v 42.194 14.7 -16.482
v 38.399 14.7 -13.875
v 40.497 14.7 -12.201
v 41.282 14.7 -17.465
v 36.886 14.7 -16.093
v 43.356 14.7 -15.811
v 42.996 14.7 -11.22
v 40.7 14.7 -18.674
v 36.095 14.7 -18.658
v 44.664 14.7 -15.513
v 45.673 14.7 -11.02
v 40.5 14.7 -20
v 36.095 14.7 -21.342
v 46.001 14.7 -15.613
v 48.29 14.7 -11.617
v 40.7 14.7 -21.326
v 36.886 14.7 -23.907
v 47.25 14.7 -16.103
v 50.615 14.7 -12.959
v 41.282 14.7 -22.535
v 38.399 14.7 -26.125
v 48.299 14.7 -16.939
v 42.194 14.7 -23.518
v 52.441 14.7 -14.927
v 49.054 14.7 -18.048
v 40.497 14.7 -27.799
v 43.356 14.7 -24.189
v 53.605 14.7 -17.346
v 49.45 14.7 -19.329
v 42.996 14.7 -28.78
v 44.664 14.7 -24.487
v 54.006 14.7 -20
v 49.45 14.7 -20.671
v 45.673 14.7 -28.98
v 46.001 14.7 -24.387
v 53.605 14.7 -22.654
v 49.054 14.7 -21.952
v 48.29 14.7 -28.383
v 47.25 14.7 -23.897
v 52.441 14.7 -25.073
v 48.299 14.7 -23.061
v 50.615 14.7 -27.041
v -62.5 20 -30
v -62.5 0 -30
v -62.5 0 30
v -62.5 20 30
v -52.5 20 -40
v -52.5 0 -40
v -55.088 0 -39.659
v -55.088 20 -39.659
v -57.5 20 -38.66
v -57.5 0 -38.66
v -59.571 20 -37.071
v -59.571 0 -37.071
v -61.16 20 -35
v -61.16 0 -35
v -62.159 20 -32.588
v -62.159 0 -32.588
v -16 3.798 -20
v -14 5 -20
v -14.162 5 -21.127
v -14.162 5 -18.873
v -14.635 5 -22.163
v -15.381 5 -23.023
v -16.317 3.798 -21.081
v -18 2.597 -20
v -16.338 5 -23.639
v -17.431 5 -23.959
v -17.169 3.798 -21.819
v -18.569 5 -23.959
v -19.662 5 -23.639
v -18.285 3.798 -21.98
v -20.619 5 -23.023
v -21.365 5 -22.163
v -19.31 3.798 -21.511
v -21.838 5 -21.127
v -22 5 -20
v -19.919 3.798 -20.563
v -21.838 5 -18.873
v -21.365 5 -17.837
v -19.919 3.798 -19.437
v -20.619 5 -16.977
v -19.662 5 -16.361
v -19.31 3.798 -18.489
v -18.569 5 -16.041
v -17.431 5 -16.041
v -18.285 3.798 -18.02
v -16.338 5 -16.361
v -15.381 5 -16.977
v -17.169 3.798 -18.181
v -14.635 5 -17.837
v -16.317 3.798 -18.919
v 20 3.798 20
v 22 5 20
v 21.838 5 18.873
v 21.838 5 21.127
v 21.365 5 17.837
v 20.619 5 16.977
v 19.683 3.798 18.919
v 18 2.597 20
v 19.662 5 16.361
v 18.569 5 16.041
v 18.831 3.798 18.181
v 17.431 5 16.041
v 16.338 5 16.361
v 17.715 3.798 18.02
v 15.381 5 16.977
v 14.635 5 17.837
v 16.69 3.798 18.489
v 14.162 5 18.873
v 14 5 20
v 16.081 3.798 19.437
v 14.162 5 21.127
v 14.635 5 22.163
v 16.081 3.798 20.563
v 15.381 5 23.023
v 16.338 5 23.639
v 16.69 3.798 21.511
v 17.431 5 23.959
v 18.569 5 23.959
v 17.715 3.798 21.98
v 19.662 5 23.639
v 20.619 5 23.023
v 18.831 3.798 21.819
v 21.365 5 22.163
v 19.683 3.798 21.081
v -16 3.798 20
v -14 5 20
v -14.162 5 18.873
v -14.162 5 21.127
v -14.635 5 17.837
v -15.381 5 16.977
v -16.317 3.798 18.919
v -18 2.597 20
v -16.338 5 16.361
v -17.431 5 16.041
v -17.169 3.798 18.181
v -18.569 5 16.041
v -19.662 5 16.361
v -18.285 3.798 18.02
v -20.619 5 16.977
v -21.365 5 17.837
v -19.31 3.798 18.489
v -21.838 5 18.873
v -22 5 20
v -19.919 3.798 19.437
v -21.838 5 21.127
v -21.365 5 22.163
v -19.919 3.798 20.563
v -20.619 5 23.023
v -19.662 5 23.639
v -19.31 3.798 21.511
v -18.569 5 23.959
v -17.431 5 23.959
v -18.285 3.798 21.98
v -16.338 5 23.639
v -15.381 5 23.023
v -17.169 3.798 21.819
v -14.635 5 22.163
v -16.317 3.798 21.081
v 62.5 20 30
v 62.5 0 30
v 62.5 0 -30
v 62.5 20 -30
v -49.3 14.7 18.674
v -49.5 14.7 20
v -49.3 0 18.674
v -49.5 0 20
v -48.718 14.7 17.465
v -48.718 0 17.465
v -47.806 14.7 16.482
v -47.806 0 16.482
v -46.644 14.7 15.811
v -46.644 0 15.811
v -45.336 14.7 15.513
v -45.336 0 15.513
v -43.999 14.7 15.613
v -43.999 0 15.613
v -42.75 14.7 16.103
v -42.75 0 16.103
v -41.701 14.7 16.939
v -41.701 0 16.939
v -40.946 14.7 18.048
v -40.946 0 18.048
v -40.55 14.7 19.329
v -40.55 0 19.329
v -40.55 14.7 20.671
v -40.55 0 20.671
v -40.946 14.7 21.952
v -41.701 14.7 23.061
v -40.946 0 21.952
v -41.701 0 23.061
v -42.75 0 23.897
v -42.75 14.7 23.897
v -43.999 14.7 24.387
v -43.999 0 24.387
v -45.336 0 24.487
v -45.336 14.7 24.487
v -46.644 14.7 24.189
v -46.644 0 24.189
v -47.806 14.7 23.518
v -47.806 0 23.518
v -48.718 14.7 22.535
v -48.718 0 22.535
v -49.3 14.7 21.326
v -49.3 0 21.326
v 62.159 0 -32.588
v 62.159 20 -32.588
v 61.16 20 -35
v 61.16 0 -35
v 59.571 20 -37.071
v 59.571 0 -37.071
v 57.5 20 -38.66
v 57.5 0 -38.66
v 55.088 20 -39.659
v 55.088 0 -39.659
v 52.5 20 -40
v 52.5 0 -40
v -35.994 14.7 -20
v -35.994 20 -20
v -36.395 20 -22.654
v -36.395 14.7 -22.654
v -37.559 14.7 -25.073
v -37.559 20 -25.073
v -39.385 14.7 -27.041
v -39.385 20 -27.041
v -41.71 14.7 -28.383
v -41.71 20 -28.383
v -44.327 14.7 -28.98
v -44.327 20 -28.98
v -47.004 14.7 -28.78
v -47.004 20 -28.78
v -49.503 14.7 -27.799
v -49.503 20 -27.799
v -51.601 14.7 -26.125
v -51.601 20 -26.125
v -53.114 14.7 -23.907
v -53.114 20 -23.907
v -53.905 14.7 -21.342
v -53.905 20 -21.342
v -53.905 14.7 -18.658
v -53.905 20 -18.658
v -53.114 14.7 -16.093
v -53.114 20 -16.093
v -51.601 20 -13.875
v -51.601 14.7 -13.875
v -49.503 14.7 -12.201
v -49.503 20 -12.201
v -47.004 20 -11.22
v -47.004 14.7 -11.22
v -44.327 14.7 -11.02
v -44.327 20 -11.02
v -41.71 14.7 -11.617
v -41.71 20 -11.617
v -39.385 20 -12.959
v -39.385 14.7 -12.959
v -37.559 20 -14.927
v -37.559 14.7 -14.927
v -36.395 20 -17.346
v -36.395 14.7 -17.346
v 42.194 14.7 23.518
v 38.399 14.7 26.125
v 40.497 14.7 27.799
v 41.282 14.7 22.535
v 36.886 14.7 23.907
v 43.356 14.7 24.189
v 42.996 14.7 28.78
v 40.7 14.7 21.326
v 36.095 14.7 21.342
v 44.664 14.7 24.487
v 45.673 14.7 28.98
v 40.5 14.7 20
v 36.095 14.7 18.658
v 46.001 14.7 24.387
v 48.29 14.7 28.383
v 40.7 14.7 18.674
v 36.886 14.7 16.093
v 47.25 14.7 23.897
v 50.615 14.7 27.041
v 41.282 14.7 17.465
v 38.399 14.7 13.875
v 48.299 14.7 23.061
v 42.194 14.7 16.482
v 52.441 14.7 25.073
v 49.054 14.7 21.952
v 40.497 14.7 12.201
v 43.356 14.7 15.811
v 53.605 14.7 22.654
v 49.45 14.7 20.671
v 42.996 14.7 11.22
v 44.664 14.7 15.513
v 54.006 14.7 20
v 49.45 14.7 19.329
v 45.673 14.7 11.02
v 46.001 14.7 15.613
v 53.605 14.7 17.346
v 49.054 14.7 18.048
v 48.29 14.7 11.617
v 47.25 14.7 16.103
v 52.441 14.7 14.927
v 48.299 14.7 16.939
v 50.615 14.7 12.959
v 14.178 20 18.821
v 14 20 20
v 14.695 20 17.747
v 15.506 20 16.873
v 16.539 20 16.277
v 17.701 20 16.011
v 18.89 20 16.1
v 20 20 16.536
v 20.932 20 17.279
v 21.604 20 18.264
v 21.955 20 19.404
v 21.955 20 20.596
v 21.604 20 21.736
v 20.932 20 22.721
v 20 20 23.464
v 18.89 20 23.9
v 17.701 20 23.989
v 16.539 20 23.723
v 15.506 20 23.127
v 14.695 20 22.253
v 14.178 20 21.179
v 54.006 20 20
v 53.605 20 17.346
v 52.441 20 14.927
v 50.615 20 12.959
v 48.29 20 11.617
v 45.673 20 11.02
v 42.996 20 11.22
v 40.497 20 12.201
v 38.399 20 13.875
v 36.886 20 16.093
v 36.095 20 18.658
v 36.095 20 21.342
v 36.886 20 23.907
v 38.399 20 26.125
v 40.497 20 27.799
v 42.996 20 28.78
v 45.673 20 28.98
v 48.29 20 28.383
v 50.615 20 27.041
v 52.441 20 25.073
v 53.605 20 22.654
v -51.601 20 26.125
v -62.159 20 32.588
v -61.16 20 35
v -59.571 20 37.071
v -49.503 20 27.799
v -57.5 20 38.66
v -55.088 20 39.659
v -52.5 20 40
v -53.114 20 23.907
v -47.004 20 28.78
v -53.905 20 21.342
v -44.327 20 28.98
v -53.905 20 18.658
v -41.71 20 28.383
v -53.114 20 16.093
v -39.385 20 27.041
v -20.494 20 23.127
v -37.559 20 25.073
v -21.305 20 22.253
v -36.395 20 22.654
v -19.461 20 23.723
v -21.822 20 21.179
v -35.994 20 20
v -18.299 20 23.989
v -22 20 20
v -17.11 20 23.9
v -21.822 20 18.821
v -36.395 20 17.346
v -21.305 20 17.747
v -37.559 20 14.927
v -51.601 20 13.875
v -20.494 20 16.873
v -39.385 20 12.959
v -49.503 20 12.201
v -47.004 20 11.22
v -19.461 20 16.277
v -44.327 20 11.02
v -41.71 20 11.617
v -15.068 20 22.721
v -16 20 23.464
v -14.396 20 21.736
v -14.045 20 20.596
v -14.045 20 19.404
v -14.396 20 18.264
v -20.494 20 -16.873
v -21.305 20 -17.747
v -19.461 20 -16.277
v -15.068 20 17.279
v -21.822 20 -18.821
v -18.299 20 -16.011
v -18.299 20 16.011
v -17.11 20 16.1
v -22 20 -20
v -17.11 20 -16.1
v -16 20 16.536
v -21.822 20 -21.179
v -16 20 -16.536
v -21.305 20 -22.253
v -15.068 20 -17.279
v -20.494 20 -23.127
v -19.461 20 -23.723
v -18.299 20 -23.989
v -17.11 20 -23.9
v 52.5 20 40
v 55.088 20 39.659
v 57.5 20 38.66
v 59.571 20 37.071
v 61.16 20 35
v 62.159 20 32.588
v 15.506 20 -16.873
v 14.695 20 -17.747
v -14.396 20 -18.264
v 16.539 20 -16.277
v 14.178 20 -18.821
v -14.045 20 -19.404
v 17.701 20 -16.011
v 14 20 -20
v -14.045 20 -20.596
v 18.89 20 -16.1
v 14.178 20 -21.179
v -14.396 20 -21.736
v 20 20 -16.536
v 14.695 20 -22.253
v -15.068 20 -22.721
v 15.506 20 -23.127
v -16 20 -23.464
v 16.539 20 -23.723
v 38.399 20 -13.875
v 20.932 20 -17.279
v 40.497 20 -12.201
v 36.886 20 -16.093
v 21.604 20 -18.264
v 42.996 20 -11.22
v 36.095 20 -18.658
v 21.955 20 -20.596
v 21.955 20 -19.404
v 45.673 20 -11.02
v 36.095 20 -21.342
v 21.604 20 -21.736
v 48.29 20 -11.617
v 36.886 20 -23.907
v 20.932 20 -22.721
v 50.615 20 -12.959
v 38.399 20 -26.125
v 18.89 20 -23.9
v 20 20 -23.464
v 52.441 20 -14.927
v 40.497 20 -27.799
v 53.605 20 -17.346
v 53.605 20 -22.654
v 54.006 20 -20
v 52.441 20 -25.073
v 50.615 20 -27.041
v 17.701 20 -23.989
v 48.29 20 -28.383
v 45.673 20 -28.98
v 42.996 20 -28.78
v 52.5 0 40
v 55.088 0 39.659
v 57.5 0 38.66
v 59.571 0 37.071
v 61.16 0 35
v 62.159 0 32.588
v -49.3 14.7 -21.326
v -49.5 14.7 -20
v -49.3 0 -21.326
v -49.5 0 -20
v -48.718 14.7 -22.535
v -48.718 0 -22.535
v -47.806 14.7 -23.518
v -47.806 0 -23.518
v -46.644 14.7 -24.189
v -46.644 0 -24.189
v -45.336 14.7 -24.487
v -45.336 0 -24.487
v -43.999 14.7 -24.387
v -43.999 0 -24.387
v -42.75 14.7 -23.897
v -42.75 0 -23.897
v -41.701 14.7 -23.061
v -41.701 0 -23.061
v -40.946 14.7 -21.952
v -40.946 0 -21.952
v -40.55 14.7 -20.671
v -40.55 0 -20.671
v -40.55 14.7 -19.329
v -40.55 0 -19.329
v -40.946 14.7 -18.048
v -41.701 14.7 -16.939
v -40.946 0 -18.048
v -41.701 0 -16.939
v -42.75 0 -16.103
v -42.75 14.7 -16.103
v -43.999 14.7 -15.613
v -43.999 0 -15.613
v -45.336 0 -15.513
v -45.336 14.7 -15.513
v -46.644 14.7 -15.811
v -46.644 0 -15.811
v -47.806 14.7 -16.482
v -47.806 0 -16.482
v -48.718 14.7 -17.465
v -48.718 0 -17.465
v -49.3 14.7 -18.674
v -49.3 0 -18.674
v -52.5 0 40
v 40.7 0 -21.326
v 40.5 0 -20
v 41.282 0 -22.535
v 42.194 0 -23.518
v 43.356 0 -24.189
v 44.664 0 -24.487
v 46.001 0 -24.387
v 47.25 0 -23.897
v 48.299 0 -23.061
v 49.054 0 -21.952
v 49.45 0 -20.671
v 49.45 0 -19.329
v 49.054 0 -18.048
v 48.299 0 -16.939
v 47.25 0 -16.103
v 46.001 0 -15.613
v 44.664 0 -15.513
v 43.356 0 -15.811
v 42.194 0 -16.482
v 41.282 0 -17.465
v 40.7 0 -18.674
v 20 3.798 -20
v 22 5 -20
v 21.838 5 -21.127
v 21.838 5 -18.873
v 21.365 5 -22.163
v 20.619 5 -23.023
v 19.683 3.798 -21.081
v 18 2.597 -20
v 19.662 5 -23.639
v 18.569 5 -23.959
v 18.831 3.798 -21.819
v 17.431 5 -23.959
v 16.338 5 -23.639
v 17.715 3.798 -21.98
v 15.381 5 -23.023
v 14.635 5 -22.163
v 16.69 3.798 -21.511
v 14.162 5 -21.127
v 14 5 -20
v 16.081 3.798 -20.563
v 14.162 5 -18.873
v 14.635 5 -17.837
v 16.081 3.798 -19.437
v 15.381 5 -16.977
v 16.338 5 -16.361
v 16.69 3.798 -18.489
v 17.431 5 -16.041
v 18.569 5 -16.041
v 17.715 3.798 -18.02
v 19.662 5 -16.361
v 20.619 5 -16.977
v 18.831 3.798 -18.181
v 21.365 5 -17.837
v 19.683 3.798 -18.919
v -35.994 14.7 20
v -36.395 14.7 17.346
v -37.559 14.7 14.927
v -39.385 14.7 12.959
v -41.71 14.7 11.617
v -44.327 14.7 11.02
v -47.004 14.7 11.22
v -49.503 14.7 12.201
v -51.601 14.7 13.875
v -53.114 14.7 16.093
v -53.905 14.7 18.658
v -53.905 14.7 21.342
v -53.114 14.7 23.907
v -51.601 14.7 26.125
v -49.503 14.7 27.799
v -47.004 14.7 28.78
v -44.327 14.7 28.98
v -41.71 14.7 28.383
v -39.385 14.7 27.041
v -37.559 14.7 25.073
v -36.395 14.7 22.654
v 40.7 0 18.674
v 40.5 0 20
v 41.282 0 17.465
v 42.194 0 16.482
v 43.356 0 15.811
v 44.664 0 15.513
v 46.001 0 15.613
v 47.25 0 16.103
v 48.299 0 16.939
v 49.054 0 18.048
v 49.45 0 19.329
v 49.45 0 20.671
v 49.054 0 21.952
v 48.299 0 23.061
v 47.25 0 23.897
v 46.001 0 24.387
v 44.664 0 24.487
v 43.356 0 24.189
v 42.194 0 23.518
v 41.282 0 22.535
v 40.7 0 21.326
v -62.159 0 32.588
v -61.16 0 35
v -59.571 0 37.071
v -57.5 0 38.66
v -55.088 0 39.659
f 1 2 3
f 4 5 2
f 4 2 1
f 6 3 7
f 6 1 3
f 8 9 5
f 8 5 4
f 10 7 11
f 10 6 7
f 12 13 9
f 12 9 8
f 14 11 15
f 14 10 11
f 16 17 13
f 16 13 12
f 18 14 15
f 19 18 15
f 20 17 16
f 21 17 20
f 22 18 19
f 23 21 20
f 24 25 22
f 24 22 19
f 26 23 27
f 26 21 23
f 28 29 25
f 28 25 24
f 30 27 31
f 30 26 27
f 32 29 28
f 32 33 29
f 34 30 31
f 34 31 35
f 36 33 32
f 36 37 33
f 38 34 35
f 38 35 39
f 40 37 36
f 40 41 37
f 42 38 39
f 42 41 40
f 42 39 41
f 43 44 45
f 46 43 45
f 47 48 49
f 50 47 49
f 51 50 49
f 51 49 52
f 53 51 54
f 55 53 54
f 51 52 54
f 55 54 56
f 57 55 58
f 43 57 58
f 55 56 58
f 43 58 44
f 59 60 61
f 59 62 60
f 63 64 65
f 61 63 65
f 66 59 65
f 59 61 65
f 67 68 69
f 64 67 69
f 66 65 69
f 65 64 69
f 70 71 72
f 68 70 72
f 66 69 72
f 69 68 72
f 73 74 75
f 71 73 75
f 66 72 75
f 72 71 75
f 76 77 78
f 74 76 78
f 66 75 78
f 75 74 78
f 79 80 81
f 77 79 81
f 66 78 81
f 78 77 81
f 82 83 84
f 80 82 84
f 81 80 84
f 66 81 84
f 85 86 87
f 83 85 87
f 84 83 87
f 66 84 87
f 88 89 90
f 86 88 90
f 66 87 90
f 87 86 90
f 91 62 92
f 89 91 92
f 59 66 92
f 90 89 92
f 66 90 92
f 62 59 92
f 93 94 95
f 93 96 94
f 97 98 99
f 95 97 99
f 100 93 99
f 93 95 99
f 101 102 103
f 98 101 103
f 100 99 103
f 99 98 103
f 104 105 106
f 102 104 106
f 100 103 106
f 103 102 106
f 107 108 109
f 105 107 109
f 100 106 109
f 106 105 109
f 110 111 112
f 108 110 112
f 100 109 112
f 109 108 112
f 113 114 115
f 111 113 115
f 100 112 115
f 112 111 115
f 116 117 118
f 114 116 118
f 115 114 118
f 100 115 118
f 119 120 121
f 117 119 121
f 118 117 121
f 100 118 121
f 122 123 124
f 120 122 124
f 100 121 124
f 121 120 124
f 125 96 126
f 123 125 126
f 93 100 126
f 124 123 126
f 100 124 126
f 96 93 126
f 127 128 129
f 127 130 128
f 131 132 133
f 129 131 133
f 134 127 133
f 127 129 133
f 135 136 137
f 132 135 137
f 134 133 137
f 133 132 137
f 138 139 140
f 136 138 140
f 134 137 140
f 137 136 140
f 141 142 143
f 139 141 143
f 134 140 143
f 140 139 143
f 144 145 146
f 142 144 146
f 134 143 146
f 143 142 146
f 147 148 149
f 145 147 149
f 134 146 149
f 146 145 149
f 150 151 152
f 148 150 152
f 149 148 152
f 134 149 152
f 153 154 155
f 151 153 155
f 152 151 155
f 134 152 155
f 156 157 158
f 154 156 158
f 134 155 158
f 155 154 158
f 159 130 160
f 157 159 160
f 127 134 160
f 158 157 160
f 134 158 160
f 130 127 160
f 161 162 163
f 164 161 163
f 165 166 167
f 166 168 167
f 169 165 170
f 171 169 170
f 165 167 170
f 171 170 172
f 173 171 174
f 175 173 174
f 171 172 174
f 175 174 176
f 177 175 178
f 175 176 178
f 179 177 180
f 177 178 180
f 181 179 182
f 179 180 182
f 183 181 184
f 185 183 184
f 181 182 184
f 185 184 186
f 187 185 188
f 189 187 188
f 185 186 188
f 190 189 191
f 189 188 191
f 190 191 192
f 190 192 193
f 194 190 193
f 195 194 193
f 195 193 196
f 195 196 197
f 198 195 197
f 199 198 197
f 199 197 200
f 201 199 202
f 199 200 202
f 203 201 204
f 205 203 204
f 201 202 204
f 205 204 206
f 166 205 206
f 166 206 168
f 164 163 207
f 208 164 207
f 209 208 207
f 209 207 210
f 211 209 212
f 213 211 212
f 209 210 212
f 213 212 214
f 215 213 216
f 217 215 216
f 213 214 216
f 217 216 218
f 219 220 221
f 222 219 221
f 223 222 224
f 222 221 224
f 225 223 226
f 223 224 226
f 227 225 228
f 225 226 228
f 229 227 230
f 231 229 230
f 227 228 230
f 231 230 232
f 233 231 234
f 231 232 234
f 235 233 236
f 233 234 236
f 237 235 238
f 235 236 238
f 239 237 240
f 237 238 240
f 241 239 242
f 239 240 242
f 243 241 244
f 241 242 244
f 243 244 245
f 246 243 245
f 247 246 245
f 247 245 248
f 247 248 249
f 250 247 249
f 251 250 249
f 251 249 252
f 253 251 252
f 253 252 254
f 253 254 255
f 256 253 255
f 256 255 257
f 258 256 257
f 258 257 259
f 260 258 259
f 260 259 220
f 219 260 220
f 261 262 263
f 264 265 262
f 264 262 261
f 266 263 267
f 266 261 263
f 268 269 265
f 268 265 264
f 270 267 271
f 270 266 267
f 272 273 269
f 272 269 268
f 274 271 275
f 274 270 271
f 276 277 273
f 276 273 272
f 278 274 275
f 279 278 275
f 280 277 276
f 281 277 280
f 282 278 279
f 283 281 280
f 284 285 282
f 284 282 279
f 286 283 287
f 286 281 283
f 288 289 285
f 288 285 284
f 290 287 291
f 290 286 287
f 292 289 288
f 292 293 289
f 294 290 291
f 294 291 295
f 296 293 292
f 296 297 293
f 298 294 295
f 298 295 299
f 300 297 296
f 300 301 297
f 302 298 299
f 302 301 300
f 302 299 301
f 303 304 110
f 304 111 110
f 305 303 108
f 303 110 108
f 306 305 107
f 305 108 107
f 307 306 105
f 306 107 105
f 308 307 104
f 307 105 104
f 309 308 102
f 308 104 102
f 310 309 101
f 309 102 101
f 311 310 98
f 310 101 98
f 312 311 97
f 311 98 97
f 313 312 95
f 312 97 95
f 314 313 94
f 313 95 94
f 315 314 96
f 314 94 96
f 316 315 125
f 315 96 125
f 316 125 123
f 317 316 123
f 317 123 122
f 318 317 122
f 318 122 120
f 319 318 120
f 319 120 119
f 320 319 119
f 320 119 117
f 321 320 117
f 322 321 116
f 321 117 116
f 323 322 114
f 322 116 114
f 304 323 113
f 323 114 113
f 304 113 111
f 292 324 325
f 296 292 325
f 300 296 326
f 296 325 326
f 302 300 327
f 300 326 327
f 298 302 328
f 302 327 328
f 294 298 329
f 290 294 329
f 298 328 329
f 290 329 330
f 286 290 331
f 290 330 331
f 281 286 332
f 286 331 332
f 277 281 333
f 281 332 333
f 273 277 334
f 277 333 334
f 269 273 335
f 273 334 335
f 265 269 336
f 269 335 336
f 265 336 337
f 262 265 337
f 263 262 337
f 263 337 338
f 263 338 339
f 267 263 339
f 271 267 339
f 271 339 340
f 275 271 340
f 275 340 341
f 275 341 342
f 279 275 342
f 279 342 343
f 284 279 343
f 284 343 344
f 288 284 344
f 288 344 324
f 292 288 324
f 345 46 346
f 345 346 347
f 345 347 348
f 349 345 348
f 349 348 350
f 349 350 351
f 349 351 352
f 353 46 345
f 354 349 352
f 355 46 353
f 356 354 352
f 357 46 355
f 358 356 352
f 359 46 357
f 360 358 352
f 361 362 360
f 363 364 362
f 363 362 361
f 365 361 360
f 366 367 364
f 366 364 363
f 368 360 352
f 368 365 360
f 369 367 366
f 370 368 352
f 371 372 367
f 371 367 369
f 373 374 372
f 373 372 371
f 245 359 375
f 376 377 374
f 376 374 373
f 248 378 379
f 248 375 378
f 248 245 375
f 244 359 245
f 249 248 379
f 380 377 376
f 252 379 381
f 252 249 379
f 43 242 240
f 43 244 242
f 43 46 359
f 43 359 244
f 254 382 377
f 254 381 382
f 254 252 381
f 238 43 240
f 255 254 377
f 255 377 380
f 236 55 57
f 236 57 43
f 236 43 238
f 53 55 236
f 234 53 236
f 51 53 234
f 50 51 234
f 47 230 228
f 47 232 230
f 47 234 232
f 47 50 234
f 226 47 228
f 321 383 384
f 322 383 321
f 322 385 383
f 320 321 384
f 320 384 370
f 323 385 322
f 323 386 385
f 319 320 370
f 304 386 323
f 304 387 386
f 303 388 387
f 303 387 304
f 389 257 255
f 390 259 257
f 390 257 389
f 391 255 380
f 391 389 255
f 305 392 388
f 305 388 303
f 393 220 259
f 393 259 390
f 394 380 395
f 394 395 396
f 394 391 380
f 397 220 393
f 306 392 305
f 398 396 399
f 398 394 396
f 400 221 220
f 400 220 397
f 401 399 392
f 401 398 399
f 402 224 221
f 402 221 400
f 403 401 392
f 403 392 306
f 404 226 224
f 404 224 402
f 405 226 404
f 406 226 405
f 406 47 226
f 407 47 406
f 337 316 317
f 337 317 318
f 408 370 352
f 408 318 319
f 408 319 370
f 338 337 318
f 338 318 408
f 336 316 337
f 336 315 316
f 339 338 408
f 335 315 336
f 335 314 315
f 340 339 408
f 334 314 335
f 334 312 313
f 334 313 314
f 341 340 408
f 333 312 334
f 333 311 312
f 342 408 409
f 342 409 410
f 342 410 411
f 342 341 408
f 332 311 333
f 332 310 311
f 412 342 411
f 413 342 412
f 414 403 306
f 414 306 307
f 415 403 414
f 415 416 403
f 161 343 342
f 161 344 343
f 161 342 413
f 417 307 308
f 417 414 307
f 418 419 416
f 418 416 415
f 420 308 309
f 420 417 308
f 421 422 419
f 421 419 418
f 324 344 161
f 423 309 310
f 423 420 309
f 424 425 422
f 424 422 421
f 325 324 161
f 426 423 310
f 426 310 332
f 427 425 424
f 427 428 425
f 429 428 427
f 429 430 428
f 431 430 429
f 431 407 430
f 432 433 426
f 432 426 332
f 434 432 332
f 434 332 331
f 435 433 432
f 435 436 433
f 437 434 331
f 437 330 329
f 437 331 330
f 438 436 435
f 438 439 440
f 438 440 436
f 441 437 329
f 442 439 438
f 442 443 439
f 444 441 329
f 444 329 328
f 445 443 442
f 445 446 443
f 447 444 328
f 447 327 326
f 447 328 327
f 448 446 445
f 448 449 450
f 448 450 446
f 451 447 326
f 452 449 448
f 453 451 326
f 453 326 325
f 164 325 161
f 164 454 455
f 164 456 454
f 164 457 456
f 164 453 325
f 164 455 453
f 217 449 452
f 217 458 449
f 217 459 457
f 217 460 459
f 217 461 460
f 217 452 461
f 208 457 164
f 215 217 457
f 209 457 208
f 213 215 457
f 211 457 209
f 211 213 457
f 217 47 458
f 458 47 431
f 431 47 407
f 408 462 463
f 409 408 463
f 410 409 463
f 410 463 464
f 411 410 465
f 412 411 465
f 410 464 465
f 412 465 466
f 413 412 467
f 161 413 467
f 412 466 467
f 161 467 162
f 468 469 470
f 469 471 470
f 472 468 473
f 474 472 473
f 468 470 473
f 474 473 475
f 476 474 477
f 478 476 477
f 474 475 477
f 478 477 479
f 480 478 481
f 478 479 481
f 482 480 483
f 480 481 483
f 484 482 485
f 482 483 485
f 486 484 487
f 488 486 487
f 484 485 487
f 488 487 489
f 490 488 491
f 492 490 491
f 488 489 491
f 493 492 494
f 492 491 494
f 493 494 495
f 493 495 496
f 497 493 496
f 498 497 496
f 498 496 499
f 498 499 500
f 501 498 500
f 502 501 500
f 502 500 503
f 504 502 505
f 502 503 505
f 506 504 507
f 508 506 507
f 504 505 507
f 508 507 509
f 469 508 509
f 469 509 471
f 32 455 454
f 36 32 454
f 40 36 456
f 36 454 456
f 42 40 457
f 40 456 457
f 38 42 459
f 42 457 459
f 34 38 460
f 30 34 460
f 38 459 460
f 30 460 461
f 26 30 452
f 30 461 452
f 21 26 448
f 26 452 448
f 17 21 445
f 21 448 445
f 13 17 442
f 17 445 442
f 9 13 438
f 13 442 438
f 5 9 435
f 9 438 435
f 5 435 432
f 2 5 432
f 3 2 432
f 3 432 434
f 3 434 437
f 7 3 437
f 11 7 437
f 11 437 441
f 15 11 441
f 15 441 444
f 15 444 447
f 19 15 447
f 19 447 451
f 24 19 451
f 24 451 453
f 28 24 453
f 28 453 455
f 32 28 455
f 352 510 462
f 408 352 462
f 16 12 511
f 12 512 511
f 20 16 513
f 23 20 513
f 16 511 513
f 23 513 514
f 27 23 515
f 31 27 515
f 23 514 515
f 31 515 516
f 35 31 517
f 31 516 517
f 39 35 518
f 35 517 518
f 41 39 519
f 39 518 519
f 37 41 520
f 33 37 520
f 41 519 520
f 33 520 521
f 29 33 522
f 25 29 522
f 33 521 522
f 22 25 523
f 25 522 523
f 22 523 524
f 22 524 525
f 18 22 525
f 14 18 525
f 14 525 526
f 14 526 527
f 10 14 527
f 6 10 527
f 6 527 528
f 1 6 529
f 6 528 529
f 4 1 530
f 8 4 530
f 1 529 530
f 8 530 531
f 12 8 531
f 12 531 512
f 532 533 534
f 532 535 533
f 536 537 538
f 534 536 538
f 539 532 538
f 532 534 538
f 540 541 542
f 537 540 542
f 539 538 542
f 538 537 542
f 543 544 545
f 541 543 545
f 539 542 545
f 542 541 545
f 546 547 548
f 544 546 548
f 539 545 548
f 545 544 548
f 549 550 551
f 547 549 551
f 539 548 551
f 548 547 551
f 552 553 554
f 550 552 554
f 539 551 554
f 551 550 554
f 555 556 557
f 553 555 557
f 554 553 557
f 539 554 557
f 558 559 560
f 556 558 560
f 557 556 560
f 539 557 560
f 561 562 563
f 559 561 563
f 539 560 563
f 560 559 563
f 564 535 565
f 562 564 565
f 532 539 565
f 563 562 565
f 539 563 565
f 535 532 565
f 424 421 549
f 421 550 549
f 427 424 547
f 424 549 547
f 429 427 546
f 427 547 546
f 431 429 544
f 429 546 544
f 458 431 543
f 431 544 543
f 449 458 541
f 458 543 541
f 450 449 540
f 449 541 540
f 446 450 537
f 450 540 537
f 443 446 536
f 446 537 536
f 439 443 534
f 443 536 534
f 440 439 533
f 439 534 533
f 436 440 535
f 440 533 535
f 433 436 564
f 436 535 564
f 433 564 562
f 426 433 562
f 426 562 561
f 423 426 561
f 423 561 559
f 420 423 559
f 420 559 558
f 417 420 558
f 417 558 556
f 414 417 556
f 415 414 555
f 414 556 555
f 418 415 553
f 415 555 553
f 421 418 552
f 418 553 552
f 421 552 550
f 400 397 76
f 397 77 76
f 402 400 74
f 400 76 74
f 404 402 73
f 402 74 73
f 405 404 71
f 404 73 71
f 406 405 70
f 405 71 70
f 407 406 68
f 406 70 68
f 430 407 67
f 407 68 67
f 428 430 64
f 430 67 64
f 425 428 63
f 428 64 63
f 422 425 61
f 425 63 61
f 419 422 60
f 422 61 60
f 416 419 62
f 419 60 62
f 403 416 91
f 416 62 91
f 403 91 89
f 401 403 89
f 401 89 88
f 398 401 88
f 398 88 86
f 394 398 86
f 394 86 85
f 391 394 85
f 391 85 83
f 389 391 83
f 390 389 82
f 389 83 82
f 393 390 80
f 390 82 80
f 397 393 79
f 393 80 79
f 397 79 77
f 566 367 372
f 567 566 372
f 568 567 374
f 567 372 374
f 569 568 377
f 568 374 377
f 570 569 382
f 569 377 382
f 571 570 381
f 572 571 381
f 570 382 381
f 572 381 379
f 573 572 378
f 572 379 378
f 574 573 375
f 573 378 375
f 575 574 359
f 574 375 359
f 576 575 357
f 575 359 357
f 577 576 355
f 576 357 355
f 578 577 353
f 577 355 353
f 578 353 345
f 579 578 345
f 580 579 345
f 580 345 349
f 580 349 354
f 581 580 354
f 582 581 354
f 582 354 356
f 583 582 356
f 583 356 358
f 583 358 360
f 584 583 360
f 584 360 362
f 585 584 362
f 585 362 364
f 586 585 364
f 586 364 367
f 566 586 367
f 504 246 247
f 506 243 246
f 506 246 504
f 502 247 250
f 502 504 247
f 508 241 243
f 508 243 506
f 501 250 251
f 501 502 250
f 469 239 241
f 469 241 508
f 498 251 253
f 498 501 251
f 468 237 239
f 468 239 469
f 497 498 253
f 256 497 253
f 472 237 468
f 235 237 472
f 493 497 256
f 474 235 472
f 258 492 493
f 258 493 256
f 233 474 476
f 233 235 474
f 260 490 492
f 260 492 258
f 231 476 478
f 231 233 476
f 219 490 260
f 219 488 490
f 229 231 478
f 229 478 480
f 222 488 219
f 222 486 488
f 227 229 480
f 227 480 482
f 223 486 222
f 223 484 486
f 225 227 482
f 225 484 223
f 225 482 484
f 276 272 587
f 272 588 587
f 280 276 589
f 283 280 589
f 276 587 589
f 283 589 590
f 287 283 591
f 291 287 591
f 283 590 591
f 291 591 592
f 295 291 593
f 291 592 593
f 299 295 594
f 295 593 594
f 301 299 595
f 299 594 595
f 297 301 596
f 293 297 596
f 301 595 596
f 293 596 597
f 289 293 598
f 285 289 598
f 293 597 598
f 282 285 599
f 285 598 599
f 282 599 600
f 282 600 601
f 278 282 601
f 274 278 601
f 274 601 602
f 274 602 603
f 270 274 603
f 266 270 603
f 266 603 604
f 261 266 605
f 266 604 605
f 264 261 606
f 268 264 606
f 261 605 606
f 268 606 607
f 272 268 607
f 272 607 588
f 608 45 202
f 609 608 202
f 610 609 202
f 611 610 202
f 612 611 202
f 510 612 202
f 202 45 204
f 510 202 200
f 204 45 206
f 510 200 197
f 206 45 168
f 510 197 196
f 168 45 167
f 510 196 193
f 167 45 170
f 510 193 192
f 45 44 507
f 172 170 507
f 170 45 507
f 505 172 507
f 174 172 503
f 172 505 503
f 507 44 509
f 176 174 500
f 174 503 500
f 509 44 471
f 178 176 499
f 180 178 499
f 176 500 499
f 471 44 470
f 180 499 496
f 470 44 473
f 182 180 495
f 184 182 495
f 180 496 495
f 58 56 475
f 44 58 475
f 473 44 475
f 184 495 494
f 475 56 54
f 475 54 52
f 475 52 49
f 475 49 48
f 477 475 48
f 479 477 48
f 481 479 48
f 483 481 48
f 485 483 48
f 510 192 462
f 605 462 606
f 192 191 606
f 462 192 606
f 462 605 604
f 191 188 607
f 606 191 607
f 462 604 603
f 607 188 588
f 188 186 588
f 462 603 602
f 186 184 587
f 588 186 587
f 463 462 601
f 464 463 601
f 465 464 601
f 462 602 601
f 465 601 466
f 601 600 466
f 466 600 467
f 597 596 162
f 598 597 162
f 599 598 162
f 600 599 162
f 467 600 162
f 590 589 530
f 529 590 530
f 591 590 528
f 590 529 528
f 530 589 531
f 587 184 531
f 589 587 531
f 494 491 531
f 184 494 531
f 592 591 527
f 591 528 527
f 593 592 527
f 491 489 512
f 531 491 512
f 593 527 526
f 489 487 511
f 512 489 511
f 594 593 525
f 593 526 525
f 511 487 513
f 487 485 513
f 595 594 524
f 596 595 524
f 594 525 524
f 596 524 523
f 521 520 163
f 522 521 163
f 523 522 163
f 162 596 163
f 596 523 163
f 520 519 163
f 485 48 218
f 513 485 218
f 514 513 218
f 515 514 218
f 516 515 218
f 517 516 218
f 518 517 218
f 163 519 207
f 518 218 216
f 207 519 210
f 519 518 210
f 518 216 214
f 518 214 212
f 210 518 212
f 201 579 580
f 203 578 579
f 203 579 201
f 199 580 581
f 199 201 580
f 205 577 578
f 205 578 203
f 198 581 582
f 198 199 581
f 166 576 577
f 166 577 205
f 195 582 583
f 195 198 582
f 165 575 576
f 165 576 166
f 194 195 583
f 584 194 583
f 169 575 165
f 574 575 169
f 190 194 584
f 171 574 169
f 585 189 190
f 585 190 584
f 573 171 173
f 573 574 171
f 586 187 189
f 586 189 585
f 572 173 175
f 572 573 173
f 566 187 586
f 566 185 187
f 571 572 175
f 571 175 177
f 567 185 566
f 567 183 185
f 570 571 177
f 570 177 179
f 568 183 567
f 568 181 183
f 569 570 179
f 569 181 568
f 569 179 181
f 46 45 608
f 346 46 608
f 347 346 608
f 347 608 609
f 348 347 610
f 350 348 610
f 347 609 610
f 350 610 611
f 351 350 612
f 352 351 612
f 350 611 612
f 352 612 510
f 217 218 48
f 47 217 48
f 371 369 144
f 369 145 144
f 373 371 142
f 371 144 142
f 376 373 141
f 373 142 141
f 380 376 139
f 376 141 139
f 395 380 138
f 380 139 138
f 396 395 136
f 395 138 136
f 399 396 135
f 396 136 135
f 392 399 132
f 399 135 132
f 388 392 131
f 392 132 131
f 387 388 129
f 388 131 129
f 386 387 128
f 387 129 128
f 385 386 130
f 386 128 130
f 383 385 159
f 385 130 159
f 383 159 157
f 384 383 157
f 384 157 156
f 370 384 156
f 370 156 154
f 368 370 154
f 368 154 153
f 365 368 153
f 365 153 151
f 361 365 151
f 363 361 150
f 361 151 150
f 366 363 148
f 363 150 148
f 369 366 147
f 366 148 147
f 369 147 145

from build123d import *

# Parameters (mm, degrees)
DODANIE_WYCI_GNI_CIE1_DEPTH                       = 20
OTWORY_USTALAJ_CE_8_0MM1_D                        = 8
OTWORY_USTALAJ_CE_8_0MM1_DEPTH                    = 15
OTWORY_USTALAJ_CE_8_0MM1_TIP                      = 2.403442476
POG_BIENIE_WALCOWE_POD_M8_RUB_Z_BEM_S_D           = 9
POG_BIENIE_WALCOWE_POD_M8_RUB_Z_BEM_S_CBORE_D     = 18.011
POG_BIENIE_WALCOWE_POD_M8_RUB_Z_BEM_S_CBORE_DEPTH = 5.3


with BuildPart() as part:
    # Szkic1 → Dodanie-wyciągnięcie1 (new body)
    with BuildSketch(Plane(origin=(0, 0, 0), x_dir=(1, 0, 0), z_dir=(0, 1, 0))):
        with BuildLine():
            Line((-52.5, -40), (52.5, -40))
            ThreePointArc((52.5, -40), (59.571067812, -37.071067812), (62.5, -30))
            Line((62.5, -30), (62.5, 30))
            ThreePointArc((62.5, 30), (59.571067812, 37.071067812), (52.5, 40))
            Line((52.5, 40), (-52.5, 40))
            ThreePointArc((-52.5, 40), (-59.571067812, 37.071067812), (-62.5, 30))
            Line((-62.5, 30), (-62.5, -30))
            ThreePointArc((-62.5, -30), (-59.571067812, -37.071067812), (-52.5, -40))
        make_face()
    extrude(amount=DODANIE_WYCI_GNI_CIE1_DEPTH)

    # Otwory ustalające Ø8.0mm1
    with Locations(Plane(origin=(0, 20, 0), x_dir=(1, 0, 0), z_dir=(0, 1, 0))):
        with Locations((-18, -20), (18, -20), (18, 20), (-18, 20)):
            Hole(OTWORY_USTALAJ_CE_8_0MM1_D / 2, depth=OTWORY_USTALAJ_CE_8_0MM1_DEPTH)
            with Locations((0, 0, -(OTWORY_USTALAJ_CE_8_0MM1_DEPTH + OTWORY_USTALAJ_CE_8_0MM1_TIP / 2))):  # 118° drill point
                Cone(0, OTWORY_USTALAJ_CE_8_0MM1_D / 2, OTWORY_USTALAJ_CE_8_0MM1_TIP, mode=Mode.SUBTRACT)

    # Pogłębienie walcowe pod M8 śrubę z łbem szeciokątnym1 (through all)
    with Locations(Plane(origin=(0, 20, 0), x_dir=(1, 0, 0), z_dir=(0, 1, 0))):
        with Locations((-45, 20), (-45, -20), (45, -20), (45, 20)):
            CounterBoreHole(POG_BIENIE_WALCOWE_POD_M8_RUB_Z_BEM_S_D / 2, POG_BIENIE_WALCOWE_POD_M8_RUB_Z_BEM_S_CBORE_D / 2, POG_BIENIE_WALCOWE_POD_M8_RUB_Z_BEM_S_CBORE_DEPTH)


solid = part.part
